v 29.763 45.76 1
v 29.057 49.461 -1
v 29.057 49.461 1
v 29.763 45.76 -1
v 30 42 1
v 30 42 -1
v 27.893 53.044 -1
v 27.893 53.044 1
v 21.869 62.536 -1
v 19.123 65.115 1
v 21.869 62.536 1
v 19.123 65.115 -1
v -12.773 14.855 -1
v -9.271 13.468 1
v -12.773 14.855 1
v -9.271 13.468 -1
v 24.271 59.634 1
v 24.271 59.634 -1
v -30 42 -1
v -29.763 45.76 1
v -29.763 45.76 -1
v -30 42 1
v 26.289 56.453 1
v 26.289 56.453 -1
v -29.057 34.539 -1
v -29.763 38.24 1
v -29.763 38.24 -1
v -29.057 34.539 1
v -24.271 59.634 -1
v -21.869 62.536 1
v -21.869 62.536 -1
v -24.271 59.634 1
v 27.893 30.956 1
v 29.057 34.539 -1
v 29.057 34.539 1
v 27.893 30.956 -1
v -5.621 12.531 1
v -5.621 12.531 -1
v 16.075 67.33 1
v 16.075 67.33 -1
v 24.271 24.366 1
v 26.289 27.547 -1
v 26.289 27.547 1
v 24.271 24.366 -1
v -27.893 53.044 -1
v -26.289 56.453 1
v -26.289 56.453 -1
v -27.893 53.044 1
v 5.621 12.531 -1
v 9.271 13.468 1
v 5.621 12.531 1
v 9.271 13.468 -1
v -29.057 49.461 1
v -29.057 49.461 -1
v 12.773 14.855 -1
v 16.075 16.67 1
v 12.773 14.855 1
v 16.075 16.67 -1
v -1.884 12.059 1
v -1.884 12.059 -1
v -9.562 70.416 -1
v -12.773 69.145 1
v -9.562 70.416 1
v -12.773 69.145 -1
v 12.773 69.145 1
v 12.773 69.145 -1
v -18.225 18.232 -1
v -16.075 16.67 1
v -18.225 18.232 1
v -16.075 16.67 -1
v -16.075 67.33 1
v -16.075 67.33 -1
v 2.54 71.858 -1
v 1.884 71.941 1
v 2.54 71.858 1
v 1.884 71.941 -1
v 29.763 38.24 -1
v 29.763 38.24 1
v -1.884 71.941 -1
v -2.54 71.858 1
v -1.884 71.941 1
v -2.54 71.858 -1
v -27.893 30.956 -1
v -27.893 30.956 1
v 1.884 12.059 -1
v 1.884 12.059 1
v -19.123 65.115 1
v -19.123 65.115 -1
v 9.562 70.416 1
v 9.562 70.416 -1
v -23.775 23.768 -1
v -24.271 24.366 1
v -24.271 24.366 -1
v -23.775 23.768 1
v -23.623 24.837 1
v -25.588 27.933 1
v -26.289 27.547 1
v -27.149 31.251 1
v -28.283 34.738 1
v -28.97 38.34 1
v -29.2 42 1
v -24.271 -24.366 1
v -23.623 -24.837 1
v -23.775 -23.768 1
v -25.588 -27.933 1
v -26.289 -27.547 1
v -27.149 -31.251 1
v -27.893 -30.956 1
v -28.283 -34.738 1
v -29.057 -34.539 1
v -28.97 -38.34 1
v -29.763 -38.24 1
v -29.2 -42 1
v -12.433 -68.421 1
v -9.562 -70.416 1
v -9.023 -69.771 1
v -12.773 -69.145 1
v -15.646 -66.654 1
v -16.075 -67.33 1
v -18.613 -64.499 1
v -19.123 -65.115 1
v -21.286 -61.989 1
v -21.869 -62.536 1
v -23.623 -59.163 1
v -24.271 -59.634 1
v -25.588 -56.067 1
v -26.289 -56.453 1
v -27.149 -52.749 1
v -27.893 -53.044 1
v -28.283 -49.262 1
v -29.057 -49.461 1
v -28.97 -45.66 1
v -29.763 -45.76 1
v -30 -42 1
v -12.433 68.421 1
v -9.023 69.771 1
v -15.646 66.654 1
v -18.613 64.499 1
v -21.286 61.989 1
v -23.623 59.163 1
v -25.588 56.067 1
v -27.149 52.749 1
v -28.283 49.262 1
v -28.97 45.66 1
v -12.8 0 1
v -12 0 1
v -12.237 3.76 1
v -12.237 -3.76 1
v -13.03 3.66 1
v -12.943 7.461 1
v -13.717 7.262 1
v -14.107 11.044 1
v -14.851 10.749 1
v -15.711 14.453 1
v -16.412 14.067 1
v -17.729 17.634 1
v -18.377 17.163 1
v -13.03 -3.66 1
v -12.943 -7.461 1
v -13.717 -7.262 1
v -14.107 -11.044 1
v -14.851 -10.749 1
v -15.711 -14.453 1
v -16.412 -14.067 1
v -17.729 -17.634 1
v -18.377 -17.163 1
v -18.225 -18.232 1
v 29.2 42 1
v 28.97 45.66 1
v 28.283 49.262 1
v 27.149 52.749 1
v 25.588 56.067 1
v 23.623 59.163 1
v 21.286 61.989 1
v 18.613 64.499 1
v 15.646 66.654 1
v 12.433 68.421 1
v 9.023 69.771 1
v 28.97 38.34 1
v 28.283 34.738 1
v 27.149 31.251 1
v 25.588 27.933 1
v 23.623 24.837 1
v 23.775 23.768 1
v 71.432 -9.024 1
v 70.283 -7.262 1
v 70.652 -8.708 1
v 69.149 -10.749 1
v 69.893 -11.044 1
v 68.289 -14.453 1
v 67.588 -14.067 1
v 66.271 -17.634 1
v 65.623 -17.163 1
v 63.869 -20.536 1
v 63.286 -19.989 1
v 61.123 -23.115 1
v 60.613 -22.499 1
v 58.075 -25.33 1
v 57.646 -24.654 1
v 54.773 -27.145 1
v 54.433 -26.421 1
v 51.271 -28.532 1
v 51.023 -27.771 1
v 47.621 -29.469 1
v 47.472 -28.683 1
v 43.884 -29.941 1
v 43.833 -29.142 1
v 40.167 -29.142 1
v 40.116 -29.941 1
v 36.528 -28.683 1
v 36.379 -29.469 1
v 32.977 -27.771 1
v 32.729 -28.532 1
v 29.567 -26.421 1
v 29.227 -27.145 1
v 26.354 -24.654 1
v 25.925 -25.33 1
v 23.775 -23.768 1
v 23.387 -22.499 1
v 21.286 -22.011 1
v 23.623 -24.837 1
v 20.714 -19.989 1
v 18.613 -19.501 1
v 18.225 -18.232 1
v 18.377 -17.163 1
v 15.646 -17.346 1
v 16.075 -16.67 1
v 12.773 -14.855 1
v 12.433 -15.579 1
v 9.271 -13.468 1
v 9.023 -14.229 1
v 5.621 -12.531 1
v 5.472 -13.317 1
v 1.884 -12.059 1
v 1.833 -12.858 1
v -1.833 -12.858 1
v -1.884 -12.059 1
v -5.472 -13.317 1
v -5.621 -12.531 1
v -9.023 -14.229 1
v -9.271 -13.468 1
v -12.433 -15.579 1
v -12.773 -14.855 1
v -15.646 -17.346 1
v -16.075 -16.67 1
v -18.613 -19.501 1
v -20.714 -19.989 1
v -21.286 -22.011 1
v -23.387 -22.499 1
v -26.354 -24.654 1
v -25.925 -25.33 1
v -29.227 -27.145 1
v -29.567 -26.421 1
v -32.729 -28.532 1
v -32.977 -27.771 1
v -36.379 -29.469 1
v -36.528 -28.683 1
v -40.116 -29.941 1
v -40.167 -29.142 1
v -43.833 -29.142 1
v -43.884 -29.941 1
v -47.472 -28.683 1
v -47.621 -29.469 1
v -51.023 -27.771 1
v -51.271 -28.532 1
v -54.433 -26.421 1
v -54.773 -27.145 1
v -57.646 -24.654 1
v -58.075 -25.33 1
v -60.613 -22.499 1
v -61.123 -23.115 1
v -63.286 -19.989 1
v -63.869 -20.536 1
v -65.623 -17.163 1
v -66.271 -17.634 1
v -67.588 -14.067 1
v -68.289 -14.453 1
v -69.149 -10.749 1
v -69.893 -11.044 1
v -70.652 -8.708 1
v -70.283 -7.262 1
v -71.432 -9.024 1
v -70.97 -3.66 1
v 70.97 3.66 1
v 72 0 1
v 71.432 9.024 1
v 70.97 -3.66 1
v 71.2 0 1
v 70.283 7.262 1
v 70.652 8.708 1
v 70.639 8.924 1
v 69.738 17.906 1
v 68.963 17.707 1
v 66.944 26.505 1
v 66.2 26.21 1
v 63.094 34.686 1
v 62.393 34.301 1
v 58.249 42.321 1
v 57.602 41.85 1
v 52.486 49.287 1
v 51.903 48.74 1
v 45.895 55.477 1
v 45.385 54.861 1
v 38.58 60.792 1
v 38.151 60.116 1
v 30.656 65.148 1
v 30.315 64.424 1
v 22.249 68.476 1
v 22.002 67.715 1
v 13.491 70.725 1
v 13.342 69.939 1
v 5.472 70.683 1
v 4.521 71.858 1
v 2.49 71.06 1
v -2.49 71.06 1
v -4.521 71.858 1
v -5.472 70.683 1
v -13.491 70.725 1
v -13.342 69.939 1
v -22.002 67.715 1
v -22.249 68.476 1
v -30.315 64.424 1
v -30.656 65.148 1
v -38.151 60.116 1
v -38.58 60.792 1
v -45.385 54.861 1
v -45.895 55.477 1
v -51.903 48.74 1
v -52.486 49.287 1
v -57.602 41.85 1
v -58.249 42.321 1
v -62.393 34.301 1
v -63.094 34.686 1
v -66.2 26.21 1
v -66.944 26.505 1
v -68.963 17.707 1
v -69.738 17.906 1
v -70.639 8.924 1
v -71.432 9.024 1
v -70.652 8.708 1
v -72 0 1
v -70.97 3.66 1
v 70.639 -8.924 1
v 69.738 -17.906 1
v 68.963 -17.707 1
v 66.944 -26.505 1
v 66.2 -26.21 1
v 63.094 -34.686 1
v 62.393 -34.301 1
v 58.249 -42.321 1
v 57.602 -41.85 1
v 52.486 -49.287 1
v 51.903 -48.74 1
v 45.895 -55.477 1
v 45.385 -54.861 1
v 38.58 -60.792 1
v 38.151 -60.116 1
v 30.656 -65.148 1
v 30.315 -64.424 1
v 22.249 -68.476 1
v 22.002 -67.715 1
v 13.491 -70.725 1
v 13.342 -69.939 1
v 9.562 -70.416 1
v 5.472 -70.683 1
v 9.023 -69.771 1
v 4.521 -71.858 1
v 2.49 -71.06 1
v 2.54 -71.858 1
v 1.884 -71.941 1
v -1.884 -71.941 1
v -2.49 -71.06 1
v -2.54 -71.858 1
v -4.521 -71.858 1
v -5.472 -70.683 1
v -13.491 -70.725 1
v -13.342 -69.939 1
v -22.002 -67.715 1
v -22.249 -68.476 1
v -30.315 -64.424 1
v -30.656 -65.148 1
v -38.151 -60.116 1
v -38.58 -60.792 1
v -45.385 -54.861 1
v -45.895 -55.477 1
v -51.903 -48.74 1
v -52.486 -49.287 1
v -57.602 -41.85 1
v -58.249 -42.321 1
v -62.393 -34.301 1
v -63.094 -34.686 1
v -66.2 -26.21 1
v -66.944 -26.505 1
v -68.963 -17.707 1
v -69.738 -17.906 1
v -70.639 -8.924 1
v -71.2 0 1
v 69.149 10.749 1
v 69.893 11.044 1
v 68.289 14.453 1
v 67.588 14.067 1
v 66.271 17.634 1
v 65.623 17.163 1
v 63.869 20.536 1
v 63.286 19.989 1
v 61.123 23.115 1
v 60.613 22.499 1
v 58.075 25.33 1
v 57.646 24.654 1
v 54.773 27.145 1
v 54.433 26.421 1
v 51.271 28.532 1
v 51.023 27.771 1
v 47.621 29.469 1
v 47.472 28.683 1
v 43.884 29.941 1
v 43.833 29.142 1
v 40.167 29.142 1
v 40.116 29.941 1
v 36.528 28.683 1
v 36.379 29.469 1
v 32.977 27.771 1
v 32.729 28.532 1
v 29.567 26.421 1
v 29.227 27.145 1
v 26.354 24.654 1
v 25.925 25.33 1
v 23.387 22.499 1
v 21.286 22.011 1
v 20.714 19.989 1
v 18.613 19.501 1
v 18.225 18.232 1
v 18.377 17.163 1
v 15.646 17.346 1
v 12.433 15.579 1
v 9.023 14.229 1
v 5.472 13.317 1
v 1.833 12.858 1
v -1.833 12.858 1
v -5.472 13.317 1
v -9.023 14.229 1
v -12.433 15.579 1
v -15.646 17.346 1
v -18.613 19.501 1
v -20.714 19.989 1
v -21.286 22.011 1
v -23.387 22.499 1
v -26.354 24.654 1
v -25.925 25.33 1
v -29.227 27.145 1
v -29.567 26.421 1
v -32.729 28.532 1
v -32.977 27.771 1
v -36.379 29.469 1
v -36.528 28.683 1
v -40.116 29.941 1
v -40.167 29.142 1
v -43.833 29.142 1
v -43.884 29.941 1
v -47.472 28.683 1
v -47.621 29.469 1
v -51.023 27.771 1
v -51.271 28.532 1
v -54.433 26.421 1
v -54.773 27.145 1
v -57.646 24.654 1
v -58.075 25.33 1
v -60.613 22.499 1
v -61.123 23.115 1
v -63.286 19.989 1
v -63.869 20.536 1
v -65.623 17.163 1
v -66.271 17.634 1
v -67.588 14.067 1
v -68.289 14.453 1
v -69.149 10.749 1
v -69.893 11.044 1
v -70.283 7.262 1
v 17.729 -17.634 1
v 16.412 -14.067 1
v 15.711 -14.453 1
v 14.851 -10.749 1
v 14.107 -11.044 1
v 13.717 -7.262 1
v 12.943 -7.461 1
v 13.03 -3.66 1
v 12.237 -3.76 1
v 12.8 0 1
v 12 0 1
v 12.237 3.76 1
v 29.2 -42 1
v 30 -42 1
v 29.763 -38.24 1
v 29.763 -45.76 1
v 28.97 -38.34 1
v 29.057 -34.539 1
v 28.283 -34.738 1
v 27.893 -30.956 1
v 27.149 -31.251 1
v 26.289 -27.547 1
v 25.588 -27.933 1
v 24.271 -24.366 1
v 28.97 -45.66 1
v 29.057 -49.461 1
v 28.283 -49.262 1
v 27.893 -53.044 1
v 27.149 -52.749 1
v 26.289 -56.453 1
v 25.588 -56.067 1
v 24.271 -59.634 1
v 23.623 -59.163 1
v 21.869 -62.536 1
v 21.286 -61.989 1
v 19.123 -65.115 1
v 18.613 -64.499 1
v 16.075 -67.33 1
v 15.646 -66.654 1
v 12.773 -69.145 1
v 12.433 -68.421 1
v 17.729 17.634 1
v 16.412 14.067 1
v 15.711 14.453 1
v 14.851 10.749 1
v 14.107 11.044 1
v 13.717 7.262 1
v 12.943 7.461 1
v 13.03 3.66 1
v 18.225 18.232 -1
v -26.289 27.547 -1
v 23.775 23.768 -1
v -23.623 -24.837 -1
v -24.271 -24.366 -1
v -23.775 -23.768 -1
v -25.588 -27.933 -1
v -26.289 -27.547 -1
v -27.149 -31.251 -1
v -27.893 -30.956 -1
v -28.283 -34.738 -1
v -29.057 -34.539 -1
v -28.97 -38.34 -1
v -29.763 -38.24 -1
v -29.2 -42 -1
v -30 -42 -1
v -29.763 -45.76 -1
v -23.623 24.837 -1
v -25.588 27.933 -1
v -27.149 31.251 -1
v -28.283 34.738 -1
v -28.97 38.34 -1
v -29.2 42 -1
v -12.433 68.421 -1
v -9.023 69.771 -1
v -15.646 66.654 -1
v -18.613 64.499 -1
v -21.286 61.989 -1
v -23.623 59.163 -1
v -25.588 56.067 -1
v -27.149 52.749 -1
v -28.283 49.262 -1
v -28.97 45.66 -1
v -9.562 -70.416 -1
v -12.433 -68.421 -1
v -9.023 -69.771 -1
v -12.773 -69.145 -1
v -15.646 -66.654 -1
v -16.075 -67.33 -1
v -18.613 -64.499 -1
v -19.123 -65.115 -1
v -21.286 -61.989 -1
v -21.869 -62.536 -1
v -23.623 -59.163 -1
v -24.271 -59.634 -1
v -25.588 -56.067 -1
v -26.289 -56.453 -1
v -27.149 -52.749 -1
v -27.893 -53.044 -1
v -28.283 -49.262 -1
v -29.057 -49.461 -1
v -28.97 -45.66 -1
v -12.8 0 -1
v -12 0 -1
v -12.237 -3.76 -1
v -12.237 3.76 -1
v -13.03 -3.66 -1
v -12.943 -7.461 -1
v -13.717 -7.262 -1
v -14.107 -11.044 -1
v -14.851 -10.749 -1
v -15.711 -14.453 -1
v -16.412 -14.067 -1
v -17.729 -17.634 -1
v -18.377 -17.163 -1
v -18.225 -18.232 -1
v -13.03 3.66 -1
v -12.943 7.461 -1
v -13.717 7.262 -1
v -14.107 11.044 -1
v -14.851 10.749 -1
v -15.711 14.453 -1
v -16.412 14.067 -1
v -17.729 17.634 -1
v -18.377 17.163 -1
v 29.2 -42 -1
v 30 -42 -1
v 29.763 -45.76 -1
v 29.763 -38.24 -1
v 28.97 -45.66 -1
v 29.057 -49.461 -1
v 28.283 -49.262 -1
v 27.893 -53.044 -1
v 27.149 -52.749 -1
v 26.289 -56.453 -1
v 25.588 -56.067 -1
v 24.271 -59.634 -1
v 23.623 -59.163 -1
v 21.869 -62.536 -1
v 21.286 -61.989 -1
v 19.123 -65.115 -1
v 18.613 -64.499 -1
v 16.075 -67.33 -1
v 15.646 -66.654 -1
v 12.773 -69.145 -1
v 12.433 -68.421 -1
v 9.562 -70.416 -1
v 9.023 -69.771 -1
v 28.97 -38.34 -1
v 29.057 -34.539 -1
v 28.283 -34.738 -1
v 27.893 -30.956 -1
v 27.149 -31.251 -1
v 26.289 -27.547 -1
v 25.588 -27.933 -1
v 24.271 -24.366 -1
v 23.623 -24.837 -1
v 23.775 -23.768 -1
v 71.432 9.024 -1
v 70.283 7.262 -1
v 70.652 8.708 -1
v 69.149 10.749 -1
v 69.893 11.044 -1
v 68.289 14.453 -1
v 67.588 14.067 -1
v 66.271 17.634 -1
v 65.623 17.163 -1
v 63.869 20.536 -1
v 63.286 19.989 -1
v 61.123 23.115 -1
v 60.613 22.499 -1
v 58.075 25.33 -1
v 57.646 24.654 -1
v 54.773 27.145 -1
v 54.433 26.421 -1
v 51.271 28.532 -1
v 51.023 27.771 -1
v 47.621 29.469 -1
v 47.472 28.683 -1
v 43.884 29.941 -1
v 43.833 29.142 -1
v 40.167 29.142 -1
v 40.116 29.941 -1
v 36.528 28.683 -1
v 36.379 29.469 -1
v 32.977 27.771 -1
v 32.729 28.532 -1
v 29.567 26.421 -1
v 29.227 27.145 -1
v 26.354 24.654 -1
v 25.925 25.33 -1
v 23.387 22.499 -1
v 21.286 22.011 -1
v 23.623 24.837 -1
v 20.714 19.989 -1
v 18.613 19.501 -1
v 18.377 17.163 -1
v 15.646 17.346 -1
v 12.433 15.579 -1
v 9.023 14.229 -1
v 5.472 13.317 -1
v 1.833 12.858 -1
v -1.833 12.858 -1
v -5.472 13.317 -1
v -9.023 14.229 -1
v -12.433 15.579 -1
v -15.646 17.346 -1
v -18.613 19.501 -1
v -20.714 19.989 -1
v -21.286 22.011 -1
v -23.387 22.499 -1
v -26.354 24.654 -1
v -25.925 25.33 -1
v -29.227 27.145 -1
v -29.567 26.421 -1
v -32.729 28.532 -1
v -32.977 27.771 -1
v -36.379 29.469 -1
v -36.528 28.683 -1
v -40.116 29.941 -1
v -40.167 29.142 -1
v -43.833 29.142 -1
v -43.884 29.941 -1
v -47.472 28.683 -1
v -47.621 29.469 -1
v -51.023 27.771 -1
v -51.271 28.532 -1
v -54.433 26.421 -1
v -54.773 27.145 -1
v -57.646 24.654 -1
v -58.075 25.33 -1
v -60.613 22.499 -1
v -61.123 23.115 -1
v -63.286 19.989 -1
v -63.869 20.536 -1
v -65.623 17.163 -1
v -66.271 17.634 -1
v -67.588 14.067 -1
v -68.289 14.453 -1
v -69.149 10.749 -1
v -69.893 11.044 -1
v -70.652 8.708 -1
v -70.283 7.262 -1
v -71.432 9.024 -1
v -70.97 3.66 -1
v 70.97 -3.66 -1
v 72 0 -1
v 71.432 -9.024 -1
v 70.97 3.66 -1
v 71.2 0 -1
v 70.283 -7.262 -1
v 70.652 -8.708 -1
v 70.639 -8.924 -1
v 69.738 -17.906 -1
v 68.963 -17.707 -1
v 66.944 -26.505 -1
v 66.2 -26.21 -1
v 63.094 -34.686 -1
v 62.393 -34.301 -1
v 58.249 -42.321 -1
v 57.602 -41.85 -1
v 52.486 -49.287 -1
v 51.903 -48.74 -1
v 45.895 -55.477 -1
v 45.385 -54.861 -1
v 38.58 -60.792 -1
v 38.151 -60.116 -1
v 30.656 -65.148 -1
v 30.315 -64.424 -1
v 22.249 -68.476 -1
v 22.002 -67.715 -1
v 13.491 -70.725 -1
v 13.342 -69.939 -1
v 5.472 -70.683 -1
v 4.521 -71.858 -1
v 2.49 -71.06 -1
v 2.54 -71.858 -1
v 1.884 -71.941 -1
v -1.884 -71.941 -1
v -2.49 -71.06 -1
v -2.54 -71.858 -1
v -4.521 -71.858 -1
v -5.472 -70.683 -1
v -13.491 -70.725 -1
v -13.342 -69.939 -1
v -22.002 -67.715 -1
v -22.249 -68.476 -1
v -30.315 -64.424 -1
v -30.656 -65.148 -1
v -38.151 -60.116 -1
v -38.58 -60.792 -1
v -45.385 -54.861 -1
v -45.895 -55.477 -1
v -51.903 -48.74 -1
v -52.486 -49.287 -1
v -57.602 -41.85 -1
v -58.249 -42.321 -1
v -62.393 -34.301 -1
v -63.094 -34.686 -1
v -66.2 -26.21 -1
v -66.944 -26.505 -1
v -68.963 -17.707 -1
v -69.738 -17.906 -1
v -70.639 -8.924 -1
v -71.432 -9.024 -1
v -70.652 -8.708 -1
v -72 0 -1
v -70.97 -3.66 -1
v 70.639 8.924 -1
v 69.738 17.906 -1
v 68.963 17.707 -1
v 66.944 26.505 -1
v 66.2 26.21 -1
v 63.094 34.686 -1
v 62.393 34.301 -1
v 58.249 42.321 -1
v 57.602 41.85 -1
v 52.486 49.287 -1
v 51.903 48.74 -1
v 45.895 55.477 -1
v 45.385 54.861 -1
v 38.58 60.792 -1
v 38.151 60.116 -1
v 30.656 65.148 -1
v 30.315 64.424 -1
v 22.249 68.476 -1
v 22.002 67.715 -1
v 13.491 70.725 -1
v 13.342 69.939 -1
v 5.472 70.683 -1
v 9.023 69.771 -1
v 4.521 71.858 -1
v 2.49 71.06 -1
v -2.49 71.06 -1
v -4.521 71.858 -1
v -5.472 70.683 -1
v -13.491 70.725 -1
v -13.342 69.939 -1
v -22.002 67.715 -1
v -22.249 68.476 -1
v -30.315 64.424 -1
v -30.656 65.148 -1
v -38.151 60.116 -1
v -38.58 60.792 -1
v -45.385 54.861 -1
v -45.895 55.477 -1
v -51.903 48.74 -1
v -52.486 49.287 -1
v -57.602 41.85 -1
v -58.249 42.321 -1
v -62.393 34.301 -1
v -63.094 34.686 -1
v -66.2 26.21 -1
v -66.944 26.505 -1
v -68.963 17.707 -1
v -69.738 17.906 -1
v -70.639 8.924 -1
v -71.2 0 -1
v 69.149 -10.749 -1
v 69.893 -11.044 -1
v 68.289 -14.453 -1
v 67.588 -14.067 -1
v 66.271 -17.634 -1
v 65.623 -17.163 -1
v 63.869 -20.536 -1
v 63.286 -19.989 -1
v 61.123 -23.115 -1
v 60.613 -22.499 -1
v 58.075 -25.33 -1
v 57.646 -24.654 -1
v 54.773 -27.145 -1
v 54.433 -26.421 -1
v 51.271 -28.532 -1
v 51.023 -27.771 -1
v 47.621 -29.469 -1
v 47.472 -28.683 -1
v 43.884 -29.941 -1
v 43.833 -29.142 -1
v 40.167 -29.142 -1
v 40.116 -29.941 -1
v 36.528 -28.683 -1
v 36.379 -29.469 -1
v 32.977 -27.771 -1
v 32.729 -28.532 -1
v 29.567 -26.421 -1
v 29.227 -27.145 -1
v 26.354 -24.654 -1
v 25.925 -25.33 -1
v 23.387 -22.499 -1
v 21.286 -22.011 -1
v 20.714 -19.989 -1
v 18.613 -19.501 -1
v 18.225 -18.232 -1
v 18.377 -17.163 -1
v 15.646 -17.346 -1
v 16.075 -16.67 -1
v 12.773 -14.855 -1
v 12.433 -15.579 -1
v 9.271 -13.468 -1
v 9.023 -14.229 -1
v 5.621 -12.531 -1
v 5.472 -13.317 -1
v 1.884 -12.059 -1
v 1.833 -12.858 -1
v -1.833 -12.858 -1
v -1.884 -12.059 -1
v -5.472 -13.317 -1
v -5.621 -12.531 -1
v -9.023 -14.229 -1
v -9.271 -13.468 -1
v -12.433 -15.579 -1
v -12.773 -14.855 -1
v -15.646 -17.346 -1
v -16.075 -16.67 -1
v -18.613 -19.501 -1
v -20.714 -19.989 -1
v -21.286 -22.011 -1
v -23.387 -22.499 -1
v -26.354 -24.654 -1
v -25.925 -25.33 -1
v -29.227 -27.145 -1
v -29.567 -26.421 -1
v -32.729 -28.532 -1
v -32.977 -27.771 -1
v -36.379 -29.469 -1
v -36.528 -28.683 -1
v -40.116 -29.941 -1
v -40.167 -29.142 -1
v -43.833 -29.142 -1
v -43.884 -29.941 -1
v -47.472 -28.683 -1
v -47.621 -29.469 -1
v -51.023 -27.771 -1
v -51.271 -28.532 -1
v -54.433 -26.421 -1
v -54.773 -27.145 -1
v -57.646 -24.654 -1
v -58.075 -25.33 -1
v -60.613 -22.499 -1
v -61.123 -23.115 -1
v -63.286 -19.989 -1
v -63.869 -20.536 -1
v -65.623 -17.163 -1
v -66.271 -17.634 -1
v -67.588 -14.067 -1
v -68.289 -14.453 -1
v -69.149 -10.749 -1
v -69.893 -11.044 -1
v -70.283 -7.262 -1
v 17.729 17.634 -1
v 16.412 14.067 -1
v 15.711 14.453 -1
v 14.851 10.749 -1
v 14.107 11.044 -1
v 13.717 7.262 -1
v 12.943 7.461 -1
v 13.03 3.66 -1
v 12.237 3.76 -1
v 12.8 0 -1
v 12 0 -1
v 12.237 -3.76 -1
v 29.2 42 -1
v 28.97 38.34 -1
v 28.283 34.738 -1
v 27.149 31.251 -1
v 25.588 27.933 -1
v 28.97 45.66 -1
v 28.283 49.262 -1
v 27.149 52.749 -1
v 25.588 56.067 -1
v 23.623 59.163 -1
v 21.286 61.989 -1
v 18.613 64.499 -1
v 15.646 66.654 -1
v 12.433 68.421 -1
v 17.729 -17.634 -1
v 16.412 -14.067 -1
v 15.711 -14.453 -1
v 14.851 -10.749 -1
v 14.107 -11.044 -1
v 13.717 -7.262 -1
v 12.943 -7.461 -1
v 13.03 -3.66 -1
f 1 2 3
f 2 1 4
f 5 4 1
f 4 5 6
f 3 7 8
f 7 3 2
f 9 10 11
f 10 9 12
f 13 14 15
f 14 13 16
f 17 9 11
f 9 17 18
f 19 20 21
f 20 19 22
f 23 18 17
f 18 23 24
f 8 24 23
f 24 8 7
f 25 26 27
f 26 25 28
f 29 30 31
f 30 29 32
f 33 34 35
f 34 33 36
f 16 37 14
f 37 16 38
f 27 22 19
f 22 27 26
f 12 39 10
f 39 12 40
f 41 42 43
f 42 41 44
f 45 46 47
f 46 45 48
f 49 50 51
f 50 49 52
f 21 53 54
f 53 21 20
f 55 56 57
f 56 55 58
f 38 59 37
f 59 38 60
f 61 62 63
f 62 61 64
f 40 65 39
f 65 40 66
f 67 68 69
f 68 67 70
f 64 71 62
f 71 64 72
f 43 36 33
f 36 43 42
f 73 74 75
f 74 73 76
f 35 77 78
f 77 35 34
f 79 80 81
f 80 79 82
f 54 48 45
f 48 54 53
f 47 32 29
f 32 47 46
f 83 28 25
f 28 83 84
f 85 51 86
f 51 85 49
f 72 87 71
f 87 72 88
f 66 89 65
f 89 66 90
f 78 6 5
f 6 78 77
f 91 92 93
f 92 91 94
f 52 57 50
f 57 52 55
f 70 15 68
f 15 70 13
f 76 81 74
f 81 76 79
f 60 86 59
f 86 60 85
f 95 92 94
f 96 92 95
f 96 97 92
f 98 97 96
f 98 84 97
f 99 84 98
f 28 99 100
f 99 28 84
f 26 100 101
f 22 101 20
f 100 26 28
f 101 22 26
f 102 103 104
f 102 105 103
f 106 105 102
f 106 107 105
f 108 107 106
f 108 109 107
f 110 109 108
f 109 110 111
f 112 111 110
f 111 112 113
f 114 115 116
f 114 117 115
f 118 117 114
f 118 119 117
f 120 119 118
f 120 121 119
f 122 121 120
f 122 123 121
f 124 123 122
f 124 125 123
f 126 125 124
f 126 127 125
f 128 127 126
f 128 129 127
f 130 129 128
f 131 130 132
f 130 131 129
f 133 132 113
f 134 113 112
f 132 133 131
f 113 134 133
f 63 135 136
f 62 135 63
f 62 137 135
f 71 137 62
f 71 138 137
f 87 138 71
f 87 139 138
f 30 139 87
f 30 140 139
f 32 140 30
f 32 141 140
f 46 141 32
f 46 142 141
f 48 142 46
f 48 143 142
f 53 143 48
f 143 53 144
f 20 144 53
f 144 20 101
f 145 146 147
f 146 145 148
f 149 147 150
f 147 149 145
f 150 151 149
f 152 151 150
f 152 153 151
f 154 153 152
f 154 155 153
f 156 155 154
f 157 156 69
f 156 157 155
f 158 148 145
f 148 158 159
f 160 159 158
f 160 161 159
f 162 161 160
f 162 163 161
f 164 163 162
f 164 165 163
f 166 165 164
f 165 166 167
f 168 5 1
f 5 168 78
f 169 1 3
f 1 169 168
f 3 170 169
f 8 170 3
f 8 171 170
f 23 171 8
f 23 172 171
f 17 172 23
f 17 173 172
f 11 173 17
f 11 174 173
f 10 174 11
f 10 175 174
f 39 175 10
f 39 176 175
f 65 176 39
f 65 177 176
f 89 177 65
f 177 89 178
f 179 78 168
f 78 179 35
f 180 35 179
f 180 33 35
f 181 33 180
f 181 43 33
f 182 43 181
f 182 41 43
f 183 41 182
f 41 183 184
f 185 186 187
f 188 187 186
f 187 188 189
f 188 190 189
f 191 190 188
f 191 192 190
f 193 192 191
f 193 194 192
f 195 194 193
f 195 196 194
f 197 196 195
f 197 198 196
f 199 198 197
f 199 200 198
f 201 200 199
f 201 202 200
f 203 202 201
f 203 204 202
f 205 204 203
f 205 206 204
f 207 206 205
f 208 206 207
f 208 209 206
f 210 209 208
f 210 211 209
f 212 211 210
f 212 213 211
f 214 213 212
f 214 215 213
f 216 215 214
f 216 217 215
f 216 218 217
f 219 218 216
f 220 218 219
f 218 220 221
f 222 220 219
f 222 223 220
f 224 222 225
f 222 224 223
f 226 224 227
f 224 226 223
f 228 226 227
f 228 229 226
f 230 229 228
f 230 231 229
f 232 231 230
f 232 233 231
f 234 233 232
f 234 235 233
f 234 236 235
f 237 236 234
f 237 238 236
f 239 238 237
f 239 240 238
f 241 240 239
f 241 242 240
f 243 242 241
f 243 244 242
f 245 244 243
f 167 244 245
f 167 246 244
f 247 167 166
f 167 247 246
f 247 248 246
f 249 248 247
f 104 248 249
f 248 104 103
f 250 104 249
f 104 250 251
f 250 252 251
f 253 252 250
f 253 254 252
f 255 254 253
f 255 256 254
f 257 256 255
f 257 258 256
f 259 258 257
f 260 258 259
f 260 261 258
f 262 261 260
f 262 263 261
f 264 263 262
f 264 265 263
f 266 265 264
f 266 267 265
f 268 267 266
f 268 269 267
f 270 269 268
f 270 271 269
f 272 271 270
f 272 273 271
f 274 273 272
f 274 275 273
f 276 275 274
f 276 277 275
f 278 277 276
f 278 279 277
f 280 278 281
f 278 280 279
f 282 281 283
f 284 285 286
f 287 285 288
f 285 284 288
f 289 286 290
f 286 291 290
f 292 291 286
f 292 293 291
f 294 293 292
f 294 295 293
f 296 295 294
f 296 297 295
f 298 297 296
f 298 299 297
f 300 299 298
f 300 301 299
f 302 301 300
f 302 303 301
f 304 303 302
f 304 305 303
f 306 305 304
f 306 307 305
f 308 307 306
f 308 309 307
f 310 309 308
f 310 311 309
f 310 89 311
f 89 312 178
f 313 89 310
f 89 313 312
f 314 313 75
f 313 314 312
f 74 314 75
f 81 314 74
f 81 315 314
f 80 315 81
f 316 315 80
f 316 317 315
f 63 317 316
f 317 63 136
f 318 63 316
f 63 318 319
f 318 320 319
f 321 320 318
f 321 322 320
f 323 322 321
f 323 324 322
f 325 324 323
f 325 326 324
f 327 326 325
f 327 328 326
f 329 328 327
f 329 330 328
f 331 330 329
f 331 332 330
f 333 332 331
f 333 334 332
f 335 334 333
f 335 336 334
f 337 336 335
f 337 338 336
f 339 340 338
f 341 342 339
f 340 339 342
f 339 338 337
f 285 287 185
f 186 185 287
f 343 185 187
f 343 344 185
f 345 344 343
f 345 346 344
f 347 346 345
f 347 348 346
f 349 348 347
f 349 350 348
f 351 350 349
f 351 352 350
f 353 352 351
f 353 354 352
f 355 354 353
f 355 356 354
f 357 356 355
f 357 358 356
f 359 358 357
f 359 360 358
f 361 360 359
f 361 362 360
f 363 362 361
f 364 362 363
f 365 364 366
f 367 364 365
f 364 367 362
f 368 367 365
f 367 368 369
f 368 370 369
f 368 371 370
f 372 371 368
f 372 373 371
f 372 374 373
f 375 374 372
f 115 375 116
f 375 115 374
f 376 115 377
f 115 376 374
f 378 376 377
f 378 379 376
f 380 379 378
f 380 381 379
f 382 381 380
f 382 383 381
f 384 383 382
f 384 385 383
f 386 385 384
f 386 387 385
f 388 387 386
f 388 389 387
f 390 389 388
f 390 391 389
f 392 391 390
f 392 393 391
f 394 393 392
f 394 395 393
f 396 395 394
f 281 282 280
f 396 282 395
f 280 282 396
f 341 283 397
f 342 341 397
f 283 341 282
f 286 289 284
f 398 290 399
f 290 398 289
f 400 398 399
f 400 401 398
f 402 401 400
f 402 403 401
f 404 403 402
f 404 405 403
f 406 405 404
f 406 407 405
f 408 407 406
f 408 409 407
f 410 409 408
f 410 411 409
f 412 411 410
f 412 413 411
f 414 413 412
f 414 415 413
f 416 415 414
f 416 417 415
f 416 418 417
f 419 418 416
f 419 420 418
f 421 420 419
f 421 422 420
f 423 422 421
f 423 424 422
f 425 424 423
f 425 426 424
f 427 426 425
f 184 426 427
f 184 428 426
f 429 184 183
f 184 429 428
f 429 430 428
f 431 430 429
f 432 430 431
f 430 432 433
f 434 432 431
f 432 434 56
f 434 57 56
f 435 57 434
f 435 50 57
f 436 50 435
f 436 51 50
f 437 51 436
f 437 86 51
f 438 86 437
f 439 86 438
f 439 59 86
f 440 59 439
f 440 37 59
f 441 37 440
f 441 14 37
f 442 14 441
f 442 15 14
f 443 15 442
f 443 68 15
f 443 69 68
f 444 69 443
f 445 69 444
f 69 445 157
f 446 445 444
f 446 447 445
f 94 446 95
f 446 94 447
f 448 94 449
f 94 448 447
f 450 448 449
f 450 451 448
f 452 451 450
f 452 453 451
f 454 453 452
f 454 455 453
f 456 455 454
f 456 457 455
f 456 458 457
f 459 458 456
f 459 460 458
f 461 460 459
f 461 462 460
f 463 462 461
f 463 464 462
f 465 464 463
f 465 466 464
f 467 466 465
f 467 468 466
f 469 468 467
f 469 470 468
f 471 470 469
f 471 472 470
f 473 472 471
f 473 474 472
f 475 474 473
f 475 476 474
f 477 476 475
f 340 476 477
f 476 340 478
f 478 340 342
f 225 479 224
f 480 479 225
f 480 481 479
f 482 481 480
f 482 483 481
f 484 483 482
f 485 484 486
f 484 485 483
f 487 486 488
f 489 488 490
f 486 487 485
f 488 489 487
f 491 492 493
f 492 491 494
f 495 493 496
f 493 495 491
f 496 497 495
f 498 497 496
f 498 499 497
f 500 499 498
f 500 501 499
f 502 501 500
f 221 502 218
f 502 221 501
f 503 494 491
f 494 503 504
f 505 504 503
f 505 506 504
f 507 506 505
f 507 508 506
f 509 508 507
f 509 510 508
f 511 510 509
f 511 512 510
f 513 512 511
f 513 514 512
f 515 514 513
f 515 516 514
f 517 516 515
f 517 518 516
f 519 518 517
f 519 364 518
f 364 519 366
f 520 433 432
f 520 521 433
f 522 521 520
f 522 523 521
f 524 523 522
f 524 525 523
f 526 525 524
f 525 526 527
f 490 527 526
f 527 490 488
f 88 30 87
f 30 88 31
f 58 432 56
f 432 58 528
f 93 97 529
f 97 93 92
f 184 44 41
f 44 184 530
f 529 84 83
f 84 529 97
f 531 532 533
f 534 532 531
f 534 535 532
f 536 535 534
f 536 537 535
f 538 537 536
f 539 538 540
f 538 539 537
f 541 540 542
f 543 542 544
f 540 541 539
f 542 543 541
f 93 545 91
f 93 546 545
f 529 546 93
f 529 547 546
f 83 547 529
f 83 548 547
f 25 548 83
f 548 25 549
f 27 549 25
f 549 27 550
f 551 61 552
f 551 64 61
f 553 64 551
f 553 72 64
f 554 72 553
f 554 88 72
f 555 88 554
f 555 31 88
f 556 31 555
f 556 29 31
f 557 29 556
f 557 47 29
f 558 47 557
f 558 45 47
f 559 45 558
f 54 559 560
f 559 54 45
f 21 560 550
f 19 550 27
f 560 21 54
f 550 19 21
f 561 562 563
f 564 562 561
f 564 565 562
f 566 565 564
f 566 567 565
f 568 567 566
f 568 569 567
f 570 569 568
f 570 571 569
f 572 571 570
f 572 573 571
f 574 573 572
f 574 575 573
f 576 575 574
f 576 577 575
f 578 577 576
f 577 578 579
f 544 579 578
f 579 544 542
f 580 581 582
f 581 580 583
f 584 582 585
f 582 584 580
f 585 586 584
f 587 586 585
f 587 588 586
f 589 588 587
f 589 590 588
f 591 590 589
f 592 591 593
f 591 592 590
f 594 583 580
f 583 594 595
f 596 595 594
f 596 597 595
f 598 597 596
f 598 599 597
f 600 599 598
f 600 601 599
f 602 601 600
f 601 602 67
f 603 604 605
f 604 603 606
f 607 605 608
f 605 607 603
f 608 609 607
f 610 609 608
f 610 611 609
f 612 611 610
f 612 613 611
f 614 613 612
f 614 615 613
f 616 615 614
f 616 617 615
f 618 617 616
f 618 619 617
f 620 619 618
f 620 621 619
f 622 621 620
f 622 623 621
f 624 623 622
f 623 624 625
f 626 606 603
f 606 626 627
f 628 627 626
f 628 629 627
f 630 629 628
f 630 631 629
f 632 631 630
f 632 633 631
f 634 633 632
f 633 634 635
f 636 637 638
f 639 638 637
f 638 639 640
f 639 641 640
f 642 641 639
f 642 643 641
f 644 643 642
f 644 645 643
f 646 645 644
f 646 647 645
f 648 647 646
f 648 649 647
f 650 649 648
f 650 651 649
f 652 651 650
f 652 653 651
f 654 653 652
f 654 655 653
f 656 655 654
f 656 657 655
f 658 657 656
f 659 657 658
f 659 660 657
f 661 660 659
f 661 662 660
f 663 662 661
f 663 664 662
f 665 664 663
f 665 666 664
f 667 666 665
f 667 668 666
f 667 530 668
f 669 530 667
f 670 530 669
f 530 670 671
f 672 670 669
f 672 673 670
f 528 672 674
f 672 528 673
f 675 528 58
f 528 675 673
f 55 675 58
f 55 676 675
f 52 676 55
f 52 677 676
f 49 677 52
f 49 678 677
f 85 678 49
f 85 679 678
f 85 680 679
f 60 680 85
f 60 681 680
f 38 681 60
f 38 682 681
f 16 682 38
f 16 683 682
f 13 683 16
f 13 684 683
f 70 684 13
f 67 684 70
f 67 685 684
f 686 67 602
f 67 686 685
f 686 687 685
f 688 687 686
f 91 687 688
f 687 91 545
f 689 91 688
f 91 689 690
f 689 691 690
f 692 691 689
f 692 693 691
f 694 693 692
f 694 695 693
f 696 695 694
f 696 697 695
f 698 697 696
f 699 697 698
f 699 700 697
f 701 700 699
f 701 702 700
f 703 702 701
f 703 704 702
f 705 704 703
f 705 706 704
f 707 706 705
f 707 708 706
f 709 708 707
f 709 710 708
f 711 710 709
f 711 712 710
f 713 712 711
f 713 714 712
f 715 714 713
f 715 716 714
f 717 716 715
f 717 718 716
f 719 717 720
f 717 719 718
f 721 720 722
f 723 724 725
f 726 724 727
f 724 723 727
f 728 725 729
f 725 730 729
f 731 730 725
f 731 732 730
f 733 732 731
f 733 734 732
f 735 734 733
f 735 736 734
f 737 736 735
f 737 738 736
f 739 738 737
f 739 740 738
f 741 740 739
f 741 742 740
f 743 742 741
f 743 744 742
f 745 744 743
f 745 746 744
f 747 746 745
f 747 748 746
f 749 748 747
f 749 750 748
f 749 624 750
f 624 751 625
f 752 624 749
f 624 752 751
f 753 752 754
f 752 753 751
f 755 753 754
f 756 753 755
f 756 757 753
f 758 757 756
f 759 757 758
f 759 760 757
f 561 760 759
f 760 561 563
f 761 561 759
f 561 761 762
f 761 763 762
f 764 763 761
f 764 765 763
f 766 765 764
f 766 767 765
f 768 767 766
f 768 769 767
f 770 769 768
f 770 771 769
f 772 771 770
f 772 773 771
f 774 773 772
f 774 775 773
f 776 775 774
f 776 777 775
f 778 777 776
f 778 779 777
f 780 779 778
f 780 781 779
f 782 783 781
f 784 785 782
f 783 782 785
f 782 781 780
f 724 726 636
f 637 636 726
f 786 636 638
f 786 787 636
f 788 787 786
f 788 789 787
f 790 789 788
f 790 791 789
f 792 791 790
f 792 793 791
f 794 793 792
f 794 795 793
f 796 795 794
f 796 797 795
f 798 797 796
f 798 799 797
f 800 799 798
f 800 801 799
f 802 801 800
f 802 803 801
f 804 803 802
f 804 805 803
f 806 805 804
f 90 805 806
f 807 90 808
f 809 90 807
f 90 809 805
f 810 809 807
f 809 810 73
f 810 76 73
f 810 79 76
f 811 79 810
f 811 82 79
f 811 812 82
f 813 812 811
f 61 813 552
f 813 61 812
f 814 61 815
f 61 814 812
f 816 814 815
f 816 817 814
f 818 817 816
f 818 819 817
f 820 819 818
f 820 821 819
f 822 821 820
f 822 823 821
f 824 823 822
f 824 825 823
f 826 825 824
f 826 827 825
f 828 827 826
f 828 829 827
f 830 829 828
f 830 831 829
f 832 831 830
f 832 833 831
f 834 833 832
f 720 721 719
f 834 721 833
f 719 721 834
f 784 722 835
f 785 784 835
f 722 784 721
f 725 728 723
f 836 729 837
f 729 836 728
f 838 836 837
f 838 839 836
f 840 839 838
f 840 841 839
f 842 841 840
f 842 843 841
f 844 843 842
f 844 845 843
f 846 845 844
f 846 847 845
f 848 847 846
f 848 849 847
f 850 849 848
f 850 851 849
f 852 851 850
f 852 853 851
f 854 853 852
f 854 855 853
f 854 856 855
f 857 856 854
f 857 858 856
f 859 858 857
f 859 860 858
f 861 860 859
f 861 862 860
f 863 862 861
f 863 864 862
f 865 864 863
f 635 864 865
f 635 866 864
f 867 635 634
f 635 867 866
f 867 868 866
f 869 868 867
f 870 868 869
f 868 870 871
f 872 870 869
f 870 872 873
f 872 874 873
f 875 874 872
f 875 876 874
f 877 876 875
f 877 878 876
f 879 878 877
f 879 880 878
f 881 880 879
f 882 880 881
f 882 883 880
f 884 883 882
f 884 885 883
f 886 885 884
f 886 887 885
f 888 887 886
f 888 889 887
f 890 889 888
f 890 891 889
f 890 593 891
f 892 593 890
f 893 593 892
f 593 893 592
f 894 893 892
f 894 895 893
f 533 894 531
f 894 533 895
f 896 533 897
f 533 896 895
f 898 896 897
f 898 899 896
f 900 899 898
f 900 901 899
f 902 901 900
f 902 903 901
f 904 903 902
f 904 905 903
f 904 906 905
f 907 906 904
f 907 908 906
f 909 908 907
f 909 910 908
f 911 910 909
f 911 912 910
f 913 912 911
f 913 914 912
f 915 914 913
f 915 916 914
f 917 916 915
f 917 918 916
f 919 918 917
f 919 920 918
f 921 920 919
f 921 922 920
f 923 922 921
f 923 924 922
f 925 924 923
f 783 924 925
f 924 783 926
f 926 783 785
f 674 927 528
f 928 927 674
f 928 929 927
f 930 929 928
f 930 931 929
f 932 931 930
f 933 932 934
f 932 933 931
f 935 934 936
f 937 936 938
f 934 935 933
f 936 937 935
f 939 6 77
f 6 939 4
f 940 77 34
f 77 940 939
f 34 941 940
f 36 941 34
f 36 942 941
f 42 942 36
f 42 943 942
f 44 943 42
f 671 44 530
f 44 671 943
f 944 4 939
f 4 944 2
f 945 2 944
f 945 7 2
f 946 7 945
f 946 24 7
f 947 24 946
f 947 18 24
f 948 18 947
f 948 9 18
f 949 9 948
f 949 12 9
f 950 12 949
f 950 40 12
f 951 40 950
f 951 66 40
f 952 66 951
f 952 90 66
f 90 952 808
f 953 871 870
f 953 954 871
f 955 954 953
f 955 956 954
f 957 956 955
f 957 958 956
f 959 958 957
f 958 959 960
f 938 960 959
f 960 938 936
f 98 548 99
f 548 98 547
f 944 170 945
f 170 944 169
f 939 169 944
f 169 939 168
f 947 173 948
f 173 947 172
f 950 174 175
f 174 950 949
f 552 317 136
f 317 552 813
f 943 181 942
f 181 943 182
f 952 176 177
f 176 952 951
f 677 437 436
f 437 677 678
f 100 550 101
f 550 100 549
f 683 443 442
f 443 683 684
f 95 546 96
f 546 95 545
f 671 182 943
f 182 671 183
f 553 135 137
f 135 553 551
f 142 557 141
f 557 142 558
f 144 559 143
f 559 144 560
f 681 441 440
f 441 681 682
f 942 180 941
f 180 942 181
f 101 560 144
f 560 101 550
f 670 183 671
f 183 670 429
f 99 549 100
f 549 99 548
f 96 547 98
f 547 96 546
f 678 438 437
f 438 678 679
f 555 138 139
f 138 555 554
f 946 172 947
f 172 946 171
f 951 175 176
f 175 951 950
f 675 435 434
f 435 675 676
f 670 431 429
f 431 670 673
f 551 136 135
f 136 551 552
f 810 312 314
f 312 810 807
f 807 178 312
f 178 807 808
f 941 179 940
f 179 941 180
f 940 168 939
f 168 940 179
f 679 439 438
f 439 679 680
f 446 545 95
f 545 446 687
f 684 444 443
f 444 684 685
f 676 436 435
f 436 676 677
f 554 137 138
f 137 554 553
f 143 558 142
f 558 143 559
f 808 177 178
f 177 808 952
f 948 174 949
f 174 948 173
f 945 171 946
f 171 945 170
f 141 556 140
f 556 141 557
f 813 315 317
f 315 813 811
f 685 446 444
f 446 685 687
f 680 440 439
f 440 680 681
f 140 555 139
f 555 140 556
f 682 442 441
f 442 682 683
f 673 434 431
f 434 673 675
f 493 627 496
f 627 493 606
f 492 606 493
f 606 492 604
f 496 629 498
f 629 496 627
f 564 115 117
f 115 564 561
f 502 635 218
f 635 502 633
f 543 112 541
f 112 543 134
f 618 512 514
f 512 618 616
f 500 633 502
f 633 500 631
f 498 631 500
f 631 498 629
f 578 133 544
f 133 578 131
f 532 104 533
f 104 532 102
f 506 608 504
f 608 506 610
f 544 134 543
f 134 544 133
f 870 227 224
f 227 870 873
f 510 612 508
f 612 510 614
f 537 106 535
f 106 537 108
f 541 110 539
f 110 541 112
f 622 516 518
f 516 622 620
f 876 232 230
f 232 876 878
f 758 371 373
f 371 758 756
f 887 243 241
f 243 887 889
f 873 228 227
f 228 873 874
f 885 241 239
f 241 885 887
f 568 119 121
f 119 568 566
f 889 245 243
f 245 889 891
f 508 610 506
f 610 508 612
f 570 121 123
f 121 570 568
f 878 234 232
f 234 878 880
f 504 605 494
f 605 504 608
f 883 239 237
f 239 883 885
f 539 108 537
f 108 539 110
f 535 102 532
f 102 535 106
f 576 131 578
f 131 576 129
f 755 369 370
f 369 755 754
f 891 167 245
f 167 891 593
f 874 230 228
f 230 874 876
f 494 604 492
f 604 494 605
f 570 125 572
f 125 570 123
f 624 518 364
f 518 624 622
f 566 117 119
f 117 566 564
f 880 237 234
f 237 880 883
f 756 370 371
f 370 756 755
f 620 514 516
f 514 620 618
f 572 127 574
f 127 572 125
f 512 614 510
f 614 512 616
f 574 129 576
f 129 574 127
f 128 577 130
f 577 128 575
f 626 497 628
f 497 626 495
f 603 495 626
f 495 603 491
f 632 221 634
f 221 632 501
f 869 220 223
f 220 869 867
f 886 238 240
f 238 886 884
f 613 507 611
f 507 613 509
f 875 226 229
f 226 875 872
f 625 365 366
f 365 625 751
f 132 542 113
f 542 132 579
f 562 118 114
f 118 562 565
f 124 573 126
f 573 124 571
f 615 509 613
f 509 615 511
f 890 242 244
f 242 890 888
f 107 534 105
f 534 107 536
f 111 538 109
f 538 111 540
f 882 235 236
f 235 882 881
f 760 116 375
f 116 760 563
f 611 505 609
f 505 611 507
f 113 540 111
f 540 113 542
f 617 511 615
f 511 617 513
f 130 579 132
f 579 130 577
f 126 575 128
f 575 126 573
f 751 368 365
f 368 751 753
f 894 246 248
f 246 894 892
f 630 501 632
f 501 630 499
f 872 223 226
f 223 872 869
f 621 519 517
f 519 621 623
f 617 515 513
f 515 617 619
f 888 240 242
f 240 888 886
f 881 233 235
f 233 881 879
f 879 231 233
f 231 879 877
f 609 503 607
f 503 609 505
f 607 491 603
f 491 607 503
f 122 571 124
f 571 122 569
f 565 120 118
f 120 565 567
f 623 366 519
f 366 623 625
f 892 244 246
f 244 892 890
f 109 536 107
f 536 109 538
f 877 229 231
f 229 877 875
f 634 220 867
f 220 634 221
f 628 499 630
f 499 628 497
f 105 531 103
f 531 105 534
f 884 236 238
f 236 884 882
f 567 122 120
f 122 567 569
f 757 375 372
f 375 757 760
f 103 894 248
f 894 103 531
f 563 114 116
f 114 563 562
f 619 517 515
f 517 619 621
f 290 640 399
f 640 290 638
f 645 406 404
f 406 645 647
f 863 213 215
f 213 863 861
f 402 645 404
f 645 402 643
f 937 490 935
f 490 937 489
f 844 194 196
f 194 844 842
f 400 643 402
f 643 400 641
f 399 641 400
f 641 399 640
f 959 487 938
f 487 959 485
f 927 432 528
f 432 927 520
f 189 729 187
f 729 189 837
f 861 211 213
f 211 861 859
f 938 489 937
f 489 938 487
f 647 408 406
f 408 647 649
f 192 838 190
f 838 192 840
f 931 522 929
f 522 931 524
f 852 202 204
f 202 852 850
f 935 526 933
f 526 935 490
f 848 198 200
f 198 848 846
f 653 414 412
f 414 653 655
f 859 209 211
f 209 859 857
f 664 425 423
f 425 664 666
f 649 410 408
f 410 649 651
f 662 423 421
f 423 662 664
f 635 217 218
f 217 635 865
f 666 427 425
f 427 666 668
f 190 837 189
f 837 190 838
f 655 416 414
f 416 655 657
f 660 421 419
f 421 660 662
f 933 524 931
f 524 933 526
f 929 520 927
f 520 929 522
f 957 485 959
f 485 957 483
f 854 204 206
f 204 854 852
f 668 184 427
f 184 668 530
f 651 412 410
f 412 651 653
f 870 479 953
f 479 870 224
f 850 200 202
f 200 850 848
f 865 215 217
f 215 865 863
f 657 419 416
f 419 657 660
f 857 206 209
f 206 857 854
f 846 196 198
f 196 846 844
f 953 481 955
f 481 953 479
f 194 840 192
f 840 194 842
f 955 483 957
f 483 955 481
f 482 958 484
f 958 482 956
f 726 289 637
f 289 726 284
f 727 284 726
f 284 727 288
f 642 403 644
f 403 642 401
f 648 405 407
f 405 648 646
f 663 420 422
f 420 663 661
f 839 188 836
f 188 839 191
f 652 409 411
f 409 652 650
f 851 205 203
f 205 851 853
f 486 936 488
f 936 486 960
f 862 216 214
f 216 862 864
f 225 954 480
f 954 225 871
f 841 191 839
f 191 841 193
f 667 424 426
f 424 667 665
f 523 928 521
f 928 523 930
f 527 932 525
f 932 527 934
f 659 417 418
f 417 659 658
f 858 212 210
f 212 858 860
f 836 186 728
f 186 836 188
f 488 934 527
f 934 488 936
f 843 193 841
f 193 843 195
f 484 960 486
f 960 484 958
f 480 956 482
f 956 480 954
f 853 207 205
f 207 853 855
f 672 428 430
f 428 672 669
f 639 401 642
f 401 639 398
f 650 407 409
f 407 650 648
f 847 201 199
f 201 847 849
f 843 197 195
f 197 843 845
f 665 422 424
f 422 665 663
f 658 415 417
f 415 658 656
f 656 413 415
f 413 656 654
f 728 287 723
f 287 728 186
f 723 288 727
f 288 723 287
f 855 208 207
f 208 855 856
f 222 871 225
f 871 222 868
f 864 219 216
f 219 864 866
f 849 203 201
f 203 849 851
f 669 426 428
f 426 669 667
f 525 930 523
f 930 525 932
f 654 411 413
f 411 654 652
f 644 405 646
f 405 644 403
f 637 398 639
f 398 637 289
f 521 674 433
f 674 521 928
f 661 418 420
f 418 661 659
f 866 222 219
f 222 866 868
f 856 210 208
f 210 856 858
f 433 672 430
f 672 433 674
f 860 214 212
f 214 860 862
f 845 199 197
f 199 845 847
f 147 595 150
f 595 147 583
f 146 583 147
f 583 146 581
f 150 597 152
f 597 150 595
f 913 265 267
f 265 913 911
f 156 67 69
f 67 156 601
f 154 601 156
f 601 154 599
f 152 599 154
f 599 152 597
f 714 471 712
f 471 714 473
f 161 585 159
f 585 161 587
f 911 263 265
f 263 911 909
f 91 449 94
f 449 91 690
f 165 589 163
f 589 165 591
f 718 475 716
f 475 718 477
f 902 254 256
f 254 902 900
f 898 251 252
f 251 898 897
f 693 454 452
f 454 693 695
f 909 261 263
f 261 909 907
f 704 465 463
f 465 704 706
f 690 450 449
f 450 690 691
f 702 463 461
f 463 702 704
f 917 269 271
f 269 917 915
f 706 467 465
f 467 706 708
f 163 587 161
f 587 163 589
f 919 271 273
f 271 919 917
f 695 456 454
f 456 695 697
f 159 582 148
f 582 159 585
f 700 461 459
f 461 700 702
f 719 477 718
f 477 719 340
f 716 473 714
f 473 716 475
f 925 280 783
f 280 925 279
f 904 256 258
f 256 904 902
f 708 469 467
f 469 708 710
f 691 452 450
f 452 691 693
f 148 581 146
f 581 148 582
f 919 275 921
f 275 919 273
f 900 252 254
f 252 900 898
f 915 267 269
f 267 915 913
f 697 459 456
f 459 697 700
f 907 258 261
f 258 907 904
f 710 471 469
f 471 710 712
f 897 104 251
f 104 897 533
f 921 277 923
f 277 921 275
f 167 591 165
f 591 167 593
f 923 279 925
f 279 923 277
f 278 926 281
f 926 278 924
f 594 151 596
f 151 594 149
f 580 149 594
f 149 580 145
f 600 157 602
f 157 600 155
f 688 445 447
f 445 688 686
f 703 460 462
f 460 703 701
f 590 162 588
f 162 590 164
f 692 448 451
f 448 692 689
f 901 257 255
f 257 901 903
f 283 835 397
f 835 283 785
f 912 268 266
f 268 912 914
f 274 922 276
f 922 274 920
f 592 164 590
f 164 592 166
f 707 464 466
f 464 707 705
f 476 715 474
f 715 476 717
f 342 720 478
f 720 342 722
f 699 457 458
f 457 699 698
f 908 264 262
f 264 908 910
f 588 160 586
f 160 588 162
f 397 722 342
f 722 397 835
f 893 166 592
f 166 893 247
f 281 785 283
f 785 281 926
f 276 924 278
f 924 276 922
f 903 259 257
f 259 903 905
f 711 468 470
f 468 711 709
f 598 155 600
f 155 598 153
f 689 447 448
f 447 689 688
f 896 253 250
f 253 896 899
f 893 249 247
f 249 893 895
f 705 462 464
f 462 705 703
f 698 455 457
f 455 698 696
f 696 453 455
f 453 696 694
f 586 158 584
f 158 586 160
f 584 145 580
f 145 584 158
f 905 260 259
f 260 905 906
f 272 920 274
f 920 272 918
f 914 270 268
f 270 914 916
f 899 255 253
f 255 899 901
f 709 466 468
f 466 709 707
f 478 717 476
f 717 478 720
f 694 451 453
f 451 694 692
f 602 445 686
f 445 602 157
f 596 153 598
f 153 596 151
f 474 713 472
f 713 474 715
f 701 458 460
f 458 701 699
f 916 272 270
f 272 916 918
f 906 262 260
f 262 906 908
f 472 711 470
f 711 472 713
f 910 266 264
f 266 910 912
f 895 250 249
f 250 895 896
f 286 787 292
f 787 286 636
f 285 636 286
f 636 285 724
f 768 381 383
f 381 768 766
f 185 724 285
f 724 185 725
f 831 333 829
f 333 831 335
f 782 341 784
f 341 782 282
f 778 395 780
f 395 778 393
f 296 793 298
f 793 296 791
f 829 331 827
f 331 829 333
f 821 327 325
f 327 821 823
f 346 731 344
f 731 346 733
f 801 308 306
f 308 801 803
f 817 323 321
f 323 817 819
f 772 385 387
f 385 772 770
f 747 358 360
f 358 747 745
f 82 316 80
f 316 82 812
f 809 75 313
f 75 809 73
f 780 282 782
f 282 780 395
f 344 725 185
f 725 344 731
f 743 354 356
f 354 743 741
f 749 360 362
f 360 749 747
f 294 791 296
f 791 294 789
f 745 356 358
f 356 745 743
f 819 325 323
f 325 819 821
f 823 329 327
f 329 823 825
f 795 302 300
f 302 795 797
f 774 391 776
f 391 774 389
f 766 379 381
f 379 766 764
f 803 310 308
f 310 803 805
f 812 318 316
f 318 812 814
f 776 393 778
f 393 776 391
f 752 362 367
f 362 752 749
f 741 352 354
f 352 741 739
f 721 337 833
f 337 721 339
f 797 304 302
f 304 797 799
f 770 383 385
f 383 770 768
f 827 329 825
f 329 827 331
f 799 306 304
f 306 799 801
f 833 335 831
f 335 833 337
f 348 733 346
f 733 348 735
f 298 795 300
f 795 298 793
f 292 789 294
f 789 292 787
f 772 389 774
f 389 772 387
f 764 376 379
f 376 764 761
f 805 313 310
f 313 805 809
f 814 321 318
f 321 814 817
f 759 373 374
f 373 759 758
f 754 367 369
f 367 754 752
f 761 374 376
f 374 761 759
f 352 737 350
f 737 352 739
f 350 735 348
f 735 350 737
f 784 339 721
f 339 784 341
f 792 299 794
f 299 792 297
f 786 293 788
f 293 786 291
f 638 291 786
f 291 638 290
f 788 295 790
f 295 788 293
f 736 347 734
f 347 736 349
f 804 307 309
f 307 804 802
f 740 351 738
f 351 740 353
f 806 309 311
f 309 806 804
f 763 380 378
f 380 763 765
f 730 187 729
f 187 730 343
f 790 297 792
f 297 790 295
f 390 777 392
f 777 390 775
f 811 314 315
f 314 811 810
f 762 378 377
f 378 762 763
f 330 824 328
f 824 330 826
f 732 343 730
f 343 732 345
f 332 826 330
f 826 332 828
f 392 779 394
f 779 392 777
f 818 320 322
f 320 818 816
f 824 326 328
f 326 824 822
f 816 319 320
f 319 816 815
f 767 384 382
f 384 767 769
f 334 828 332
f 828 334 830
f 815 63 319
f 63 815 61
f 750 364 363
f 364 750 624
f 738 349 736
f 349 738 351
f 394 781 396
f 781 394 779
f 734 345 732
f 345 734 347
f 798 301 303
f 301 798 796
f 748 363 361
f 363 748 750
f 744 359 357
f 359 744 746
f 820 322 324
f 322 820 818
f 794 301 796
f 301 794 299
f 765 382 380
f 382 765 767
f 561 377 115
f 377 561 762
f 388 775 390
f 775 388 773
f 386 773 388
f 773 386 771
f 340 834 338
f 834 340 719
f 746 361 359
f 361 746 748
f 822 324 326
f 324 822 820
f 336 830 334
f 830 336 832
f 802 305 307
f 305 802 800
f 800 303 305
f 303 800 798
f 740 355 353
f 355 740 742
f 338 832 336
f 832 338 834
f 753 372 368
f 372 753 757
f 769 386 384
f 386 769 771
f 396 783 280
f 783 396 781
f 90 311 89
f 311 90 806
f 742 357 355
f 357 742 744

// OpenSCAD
//makes a hollow cylinder
module cylshell(r,h,t){
r2 =  r-t;

difference() {
	cylinder(r = r, h = h, center = true);
	cylinder(r = r2, h = h+1, center = true);
	}
}

//makes a cylinder with four cylinders inside, optionally connecting them.
module 4ci1c(o_radius,i_radius,thickness,height,connect_inner_cylinders)
{
//oc == outercylinder, ic == innercylinder

//computed, normalized values.

//quality!
$fn=50;

ic_h=height;
ic_r=i_radius;
ic_t=thickness;

oc_h=ic_h;
oc_r=o_radius;              
oc_t=thickness;

ic_offset=oc_r-ic_r;

c_offset=ic_offset/2;  
c_length=sqrt(pow(ic_offset,2)*2)-(ic_r*2);

module connector(offset1,offset2,rot) {
		translate([offset1,offset2,0])
		rotate([0,0,rot])
		cube([thickness,c_length,height],center=true);	
	}
	
module innercylinder(offset1,offset2) {
		translate([offset1,offset2,0])
		cylshell(ic_r, ic_h,ic_t);
	}	
	
union(){
	innercylinder(0,ic_offset);
	innercylinder(0,-ic_offset);
	innercylinder(ic_offset,0);
	innercylinder(-ic_offset,0);

	cylshell(oc_r, oc_h,oc_t);
		
	if(connect_inner_cylinders){
		connector(c_offset,c_offset,45);
		connector(c_offset,-c_offset,-45);
		connector(-c_offset,-c_offset,45);
		connector(-c_offset,c_offset,-45);
		}
	}
}
//4ci1c(o_radius,i_radius,thickness,height,connect_inner_cylinders)

//4ci1c(30,11,1.2,10,true);
4ci1c(72,30,0.8,2,false);
